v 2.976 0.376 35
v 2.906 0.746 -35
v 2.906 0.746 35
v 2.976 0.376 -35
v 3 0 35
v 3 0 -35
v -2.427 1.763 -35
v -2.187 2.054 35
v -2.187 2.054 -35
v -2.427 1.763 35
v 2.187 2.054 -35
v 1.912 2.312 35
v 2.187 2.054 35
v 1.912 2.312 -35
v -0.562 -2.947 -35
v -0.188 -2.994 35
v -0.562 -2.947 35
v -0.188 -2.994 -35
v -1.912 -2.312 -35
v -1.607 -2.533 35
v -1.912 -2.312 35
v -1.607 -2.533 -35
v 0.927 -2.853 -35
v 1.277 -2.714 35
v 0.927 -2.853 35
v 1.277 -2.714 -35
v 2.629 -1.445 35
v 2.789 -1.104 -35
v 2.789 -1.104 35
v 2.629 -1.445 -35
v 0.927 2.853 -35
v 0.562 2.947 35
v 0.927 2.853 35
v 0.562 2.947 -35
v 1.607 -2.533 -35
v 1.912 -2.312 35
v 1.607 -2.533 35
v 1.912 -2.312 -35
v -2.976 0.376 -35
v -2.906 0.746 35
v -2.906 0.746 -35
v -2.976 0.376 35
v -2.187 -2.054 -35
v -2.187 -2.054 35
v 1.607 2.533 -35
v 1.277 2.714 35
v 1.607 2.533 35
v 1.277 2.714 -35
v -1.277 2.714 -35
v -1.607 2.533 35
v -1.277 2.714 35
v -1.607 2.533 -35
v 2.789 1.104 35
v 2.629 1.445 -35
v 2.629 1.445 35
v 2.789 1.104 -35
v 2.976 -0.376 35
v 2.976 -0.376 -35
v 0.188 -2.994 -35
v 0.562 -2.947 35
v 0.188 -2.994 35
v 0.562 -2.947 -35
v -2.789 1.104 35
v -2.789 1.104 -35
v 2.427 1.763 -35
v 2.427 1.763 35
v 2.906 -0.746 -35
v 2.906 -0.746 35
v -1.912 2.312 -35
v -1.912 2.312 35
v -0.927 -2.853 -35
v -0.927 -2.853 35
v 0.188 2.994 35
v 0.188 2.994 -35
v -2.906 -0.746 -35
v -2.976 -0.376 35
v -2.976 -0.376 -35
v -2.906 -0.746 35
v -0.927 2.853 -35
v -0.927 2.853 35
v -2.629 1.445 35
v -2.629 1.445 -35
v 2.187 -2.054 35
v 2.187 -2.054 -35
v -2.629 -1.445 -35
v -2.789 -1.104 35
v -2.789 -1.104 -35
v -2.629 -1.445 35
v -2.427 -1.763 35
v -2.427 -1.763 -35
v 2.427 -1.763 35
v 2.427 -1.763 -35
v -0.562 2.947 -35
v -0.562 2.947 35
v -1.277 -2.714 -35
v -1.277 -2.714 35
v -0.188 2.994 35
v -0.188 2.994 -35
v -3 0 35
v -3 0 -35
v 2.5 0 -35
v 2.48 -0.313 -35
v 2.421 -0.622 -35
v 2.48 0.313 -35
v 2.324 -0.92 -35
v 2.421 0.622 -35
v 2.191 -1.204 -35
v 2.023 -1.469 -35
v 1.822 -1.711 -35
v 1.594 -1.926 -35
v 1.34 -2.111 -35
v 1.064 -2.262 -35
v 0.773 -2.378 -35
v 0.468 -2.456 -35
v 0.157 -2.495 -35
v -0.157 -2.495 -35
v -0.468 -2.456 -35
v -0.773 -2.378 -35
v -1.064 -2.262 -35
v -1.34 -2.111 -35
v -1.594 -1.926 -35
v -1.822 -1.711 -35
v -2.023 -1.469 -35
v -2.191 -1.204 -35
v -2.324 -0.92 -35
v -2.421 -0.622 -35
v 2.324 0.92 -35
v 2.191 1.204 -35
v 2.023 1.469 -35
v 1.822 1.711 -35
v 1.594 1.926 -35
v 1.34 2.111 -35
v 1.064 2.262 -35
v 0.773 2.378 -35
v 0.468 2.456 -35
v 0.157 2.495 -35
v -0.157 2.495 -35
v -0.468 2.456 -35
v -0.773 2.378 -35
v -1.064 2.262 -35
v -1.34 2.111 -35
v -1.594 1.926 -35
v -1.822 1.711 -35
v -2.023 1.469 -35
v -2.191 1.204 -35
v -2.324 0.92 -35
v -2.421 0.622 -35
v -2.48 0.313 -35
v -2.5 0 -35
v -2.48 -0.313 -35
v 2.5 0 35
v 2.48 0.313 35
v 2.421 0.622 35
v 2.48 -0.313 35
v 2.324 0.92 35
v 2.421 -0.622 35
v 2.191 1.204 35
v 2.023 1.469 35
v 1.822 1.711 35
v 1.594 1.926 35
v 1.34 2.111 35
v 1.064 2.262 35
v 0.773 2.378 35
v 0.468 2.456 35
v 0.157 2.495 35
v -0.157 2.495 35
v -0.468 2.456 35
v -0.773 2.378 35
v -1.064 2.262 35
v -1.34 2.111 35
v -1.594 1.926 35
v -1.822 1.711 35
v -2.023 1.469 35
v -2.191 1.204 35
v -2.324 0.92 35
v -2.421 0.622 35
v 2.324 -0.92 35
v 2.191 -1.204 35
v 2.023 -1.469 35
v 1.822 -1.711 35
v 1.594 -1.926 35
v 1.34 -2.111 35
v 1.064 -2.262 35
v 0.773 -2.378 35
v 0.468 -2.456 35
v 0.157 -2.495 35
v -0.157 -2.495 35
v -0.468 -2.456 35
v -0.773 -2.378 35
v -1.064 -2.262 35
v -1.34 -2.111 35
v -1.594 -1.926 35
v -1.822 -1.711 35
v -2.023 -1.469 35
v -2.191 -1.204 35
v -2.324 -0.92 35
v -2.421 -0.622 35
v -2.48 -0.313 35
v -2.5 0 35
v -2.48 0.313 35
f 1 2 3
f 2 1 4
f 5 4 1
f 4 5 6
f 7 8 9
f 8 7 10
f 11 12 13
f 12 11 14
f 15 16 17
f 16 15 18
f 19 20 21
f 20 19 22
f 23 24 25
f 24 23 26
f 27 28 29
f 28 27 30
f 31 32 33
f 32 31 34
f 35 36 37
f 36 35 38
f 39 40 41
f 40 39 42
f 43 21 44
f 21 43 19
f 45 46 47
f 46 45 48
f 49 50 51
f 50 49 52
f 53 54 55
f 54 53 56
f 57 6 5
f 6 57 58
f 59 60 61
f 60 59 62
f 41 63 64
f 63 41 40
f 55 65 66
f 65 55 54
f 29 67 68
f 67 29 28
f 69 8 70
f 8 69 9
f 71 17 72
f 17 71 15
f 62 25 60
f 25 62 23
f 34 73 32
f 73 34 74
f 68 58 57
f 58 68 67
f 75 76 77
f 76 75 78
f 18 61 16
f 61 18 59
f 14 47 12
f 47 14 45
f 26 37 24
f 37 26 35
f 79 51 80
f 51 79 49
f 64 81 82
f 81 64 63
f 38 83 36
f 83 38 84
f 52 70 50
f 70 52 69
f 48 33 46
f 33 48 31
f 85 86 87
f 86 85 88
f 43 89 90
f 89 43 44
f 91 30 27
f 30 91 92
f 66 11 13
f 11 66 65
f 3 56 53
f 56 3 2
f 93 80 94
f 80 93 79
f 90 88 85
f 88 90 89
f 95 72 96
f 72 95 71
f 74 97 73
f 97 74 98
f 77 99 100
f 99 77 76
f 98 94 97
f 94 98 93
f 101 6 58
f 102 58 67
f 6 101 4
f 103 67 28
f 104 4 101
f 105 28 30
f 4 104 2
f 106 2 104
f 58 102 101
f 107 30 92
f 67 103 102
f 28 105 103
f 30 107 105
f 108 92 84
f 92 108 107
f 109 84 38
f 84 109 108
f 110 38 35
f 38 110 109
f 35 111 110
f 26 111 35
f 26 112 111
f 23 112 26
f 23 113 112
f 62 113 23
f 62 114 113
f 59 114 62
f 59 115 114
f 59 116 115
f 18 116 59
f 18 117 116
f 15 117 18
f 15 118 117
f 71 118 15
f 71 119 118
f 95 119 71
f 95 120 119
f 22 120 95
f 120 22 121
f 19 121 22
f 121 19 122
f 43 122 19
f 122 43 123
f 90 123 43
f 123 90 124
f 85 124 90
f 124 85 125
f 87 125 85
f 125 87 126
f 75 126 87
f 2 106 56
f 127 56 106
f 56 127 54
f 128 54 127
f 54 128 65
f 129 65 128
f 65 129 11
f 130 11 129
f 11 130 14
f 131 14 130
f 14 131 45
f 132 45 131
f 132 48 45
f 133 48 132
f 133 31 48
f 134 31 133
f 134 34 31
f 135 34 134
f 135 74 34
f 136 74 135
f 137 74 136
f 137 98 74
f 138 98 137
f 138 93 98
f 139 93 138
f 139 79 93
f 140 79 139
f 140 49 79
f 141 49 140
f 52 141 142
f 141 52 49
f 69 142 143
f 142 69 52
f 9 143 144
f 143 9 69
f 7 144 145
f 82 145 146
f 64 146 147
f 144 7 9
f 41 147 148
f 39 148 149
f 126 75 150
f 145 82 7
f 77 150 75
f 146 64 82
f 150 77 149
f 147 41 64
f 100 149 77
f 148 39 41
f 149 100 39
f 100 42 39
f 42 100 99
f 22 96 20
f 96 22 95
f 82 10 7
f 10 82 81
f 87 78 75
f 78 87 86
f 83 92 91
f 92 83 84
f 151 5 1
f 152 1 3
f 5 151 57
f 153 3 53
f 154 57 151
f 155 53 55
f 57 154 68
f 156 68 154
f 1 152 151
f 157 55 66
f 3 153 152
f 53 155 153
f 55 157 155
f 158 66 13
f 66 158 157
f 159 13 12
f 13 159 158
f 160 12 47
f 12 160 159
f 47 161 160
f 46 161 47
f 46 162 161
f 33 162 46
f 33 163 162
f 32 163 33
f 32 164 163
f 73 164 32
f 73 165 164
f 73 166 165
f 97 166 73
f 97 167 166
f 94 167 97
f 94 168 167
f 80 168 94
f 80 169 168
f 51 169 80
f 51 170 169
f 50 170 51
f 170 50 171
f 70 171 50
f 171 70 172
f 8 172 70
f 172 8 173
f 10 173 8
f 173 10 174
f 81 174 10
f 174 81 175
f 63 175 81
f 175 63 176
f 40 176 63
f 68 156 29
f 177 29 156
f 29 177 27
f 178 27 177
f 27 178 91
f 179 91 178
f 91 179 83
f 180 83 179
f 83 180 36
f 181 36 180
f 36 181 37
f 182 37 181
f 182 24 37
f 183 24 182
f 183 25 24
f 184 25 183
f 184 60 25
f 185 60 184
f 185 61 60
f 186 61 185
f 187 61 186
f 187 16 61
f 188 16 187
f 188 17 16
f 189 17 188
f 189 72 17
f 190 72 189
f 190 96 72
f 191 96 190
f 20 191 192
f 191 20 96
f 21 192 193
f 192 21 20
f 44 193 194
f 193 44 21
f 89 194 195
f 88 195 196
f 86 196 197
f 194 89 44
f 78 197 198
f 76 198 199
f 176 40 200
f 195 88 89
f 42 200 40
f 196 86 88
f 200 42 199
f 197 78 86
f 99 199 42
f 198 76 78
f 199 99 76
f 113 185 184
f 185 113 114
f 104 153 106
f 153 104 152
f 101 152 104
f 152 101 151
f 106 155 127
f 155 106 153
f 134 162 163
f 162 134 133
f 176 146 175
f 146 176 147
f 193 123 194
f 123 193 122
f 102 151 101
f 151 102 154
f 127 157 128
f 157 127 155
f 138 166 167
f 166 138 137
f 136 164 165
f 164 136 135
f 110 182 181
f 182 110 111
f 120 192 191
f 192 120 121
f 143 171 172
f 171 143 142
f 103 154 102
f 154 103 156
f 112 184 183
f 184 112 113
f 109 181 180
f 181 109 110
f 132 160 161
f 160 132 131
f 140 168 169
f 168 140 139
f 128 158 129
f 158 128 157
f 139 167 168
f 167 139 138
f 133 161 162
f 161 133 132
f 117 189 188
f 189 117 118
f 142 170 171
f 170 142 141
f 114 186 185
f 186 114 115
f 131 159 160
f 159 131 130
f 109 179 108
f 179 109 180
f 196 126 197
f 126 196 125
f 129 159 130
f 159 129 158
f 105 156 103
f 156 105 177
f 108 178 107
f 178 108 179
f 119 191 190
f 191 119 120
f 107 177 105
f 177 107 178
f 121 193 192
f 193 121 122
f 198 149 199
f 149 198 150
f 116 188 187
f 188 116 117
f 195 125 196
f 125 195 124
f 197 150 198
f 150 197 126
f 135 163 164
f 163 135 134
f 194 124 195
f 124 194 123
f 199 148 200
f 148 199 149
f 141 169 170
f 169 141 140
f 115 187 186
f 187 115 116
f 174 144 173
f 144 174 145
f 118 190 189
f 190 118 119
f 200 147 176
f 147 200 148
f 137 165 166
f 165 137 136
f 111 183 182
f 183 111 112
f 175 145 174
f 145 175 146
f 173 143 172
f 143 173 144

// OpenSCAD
$fn = 50;


difference() {
	union() {
		translate(v = [0, 0, -35.0000000000]) {
			cylinder(h = 70, r = 3.0000000000);
		}
	}
	union() {
		translate(v = [0, 0, -100.0000000000]) {
			cylinder(h = 200, r = 2.5000000000);
		}
	}
}
